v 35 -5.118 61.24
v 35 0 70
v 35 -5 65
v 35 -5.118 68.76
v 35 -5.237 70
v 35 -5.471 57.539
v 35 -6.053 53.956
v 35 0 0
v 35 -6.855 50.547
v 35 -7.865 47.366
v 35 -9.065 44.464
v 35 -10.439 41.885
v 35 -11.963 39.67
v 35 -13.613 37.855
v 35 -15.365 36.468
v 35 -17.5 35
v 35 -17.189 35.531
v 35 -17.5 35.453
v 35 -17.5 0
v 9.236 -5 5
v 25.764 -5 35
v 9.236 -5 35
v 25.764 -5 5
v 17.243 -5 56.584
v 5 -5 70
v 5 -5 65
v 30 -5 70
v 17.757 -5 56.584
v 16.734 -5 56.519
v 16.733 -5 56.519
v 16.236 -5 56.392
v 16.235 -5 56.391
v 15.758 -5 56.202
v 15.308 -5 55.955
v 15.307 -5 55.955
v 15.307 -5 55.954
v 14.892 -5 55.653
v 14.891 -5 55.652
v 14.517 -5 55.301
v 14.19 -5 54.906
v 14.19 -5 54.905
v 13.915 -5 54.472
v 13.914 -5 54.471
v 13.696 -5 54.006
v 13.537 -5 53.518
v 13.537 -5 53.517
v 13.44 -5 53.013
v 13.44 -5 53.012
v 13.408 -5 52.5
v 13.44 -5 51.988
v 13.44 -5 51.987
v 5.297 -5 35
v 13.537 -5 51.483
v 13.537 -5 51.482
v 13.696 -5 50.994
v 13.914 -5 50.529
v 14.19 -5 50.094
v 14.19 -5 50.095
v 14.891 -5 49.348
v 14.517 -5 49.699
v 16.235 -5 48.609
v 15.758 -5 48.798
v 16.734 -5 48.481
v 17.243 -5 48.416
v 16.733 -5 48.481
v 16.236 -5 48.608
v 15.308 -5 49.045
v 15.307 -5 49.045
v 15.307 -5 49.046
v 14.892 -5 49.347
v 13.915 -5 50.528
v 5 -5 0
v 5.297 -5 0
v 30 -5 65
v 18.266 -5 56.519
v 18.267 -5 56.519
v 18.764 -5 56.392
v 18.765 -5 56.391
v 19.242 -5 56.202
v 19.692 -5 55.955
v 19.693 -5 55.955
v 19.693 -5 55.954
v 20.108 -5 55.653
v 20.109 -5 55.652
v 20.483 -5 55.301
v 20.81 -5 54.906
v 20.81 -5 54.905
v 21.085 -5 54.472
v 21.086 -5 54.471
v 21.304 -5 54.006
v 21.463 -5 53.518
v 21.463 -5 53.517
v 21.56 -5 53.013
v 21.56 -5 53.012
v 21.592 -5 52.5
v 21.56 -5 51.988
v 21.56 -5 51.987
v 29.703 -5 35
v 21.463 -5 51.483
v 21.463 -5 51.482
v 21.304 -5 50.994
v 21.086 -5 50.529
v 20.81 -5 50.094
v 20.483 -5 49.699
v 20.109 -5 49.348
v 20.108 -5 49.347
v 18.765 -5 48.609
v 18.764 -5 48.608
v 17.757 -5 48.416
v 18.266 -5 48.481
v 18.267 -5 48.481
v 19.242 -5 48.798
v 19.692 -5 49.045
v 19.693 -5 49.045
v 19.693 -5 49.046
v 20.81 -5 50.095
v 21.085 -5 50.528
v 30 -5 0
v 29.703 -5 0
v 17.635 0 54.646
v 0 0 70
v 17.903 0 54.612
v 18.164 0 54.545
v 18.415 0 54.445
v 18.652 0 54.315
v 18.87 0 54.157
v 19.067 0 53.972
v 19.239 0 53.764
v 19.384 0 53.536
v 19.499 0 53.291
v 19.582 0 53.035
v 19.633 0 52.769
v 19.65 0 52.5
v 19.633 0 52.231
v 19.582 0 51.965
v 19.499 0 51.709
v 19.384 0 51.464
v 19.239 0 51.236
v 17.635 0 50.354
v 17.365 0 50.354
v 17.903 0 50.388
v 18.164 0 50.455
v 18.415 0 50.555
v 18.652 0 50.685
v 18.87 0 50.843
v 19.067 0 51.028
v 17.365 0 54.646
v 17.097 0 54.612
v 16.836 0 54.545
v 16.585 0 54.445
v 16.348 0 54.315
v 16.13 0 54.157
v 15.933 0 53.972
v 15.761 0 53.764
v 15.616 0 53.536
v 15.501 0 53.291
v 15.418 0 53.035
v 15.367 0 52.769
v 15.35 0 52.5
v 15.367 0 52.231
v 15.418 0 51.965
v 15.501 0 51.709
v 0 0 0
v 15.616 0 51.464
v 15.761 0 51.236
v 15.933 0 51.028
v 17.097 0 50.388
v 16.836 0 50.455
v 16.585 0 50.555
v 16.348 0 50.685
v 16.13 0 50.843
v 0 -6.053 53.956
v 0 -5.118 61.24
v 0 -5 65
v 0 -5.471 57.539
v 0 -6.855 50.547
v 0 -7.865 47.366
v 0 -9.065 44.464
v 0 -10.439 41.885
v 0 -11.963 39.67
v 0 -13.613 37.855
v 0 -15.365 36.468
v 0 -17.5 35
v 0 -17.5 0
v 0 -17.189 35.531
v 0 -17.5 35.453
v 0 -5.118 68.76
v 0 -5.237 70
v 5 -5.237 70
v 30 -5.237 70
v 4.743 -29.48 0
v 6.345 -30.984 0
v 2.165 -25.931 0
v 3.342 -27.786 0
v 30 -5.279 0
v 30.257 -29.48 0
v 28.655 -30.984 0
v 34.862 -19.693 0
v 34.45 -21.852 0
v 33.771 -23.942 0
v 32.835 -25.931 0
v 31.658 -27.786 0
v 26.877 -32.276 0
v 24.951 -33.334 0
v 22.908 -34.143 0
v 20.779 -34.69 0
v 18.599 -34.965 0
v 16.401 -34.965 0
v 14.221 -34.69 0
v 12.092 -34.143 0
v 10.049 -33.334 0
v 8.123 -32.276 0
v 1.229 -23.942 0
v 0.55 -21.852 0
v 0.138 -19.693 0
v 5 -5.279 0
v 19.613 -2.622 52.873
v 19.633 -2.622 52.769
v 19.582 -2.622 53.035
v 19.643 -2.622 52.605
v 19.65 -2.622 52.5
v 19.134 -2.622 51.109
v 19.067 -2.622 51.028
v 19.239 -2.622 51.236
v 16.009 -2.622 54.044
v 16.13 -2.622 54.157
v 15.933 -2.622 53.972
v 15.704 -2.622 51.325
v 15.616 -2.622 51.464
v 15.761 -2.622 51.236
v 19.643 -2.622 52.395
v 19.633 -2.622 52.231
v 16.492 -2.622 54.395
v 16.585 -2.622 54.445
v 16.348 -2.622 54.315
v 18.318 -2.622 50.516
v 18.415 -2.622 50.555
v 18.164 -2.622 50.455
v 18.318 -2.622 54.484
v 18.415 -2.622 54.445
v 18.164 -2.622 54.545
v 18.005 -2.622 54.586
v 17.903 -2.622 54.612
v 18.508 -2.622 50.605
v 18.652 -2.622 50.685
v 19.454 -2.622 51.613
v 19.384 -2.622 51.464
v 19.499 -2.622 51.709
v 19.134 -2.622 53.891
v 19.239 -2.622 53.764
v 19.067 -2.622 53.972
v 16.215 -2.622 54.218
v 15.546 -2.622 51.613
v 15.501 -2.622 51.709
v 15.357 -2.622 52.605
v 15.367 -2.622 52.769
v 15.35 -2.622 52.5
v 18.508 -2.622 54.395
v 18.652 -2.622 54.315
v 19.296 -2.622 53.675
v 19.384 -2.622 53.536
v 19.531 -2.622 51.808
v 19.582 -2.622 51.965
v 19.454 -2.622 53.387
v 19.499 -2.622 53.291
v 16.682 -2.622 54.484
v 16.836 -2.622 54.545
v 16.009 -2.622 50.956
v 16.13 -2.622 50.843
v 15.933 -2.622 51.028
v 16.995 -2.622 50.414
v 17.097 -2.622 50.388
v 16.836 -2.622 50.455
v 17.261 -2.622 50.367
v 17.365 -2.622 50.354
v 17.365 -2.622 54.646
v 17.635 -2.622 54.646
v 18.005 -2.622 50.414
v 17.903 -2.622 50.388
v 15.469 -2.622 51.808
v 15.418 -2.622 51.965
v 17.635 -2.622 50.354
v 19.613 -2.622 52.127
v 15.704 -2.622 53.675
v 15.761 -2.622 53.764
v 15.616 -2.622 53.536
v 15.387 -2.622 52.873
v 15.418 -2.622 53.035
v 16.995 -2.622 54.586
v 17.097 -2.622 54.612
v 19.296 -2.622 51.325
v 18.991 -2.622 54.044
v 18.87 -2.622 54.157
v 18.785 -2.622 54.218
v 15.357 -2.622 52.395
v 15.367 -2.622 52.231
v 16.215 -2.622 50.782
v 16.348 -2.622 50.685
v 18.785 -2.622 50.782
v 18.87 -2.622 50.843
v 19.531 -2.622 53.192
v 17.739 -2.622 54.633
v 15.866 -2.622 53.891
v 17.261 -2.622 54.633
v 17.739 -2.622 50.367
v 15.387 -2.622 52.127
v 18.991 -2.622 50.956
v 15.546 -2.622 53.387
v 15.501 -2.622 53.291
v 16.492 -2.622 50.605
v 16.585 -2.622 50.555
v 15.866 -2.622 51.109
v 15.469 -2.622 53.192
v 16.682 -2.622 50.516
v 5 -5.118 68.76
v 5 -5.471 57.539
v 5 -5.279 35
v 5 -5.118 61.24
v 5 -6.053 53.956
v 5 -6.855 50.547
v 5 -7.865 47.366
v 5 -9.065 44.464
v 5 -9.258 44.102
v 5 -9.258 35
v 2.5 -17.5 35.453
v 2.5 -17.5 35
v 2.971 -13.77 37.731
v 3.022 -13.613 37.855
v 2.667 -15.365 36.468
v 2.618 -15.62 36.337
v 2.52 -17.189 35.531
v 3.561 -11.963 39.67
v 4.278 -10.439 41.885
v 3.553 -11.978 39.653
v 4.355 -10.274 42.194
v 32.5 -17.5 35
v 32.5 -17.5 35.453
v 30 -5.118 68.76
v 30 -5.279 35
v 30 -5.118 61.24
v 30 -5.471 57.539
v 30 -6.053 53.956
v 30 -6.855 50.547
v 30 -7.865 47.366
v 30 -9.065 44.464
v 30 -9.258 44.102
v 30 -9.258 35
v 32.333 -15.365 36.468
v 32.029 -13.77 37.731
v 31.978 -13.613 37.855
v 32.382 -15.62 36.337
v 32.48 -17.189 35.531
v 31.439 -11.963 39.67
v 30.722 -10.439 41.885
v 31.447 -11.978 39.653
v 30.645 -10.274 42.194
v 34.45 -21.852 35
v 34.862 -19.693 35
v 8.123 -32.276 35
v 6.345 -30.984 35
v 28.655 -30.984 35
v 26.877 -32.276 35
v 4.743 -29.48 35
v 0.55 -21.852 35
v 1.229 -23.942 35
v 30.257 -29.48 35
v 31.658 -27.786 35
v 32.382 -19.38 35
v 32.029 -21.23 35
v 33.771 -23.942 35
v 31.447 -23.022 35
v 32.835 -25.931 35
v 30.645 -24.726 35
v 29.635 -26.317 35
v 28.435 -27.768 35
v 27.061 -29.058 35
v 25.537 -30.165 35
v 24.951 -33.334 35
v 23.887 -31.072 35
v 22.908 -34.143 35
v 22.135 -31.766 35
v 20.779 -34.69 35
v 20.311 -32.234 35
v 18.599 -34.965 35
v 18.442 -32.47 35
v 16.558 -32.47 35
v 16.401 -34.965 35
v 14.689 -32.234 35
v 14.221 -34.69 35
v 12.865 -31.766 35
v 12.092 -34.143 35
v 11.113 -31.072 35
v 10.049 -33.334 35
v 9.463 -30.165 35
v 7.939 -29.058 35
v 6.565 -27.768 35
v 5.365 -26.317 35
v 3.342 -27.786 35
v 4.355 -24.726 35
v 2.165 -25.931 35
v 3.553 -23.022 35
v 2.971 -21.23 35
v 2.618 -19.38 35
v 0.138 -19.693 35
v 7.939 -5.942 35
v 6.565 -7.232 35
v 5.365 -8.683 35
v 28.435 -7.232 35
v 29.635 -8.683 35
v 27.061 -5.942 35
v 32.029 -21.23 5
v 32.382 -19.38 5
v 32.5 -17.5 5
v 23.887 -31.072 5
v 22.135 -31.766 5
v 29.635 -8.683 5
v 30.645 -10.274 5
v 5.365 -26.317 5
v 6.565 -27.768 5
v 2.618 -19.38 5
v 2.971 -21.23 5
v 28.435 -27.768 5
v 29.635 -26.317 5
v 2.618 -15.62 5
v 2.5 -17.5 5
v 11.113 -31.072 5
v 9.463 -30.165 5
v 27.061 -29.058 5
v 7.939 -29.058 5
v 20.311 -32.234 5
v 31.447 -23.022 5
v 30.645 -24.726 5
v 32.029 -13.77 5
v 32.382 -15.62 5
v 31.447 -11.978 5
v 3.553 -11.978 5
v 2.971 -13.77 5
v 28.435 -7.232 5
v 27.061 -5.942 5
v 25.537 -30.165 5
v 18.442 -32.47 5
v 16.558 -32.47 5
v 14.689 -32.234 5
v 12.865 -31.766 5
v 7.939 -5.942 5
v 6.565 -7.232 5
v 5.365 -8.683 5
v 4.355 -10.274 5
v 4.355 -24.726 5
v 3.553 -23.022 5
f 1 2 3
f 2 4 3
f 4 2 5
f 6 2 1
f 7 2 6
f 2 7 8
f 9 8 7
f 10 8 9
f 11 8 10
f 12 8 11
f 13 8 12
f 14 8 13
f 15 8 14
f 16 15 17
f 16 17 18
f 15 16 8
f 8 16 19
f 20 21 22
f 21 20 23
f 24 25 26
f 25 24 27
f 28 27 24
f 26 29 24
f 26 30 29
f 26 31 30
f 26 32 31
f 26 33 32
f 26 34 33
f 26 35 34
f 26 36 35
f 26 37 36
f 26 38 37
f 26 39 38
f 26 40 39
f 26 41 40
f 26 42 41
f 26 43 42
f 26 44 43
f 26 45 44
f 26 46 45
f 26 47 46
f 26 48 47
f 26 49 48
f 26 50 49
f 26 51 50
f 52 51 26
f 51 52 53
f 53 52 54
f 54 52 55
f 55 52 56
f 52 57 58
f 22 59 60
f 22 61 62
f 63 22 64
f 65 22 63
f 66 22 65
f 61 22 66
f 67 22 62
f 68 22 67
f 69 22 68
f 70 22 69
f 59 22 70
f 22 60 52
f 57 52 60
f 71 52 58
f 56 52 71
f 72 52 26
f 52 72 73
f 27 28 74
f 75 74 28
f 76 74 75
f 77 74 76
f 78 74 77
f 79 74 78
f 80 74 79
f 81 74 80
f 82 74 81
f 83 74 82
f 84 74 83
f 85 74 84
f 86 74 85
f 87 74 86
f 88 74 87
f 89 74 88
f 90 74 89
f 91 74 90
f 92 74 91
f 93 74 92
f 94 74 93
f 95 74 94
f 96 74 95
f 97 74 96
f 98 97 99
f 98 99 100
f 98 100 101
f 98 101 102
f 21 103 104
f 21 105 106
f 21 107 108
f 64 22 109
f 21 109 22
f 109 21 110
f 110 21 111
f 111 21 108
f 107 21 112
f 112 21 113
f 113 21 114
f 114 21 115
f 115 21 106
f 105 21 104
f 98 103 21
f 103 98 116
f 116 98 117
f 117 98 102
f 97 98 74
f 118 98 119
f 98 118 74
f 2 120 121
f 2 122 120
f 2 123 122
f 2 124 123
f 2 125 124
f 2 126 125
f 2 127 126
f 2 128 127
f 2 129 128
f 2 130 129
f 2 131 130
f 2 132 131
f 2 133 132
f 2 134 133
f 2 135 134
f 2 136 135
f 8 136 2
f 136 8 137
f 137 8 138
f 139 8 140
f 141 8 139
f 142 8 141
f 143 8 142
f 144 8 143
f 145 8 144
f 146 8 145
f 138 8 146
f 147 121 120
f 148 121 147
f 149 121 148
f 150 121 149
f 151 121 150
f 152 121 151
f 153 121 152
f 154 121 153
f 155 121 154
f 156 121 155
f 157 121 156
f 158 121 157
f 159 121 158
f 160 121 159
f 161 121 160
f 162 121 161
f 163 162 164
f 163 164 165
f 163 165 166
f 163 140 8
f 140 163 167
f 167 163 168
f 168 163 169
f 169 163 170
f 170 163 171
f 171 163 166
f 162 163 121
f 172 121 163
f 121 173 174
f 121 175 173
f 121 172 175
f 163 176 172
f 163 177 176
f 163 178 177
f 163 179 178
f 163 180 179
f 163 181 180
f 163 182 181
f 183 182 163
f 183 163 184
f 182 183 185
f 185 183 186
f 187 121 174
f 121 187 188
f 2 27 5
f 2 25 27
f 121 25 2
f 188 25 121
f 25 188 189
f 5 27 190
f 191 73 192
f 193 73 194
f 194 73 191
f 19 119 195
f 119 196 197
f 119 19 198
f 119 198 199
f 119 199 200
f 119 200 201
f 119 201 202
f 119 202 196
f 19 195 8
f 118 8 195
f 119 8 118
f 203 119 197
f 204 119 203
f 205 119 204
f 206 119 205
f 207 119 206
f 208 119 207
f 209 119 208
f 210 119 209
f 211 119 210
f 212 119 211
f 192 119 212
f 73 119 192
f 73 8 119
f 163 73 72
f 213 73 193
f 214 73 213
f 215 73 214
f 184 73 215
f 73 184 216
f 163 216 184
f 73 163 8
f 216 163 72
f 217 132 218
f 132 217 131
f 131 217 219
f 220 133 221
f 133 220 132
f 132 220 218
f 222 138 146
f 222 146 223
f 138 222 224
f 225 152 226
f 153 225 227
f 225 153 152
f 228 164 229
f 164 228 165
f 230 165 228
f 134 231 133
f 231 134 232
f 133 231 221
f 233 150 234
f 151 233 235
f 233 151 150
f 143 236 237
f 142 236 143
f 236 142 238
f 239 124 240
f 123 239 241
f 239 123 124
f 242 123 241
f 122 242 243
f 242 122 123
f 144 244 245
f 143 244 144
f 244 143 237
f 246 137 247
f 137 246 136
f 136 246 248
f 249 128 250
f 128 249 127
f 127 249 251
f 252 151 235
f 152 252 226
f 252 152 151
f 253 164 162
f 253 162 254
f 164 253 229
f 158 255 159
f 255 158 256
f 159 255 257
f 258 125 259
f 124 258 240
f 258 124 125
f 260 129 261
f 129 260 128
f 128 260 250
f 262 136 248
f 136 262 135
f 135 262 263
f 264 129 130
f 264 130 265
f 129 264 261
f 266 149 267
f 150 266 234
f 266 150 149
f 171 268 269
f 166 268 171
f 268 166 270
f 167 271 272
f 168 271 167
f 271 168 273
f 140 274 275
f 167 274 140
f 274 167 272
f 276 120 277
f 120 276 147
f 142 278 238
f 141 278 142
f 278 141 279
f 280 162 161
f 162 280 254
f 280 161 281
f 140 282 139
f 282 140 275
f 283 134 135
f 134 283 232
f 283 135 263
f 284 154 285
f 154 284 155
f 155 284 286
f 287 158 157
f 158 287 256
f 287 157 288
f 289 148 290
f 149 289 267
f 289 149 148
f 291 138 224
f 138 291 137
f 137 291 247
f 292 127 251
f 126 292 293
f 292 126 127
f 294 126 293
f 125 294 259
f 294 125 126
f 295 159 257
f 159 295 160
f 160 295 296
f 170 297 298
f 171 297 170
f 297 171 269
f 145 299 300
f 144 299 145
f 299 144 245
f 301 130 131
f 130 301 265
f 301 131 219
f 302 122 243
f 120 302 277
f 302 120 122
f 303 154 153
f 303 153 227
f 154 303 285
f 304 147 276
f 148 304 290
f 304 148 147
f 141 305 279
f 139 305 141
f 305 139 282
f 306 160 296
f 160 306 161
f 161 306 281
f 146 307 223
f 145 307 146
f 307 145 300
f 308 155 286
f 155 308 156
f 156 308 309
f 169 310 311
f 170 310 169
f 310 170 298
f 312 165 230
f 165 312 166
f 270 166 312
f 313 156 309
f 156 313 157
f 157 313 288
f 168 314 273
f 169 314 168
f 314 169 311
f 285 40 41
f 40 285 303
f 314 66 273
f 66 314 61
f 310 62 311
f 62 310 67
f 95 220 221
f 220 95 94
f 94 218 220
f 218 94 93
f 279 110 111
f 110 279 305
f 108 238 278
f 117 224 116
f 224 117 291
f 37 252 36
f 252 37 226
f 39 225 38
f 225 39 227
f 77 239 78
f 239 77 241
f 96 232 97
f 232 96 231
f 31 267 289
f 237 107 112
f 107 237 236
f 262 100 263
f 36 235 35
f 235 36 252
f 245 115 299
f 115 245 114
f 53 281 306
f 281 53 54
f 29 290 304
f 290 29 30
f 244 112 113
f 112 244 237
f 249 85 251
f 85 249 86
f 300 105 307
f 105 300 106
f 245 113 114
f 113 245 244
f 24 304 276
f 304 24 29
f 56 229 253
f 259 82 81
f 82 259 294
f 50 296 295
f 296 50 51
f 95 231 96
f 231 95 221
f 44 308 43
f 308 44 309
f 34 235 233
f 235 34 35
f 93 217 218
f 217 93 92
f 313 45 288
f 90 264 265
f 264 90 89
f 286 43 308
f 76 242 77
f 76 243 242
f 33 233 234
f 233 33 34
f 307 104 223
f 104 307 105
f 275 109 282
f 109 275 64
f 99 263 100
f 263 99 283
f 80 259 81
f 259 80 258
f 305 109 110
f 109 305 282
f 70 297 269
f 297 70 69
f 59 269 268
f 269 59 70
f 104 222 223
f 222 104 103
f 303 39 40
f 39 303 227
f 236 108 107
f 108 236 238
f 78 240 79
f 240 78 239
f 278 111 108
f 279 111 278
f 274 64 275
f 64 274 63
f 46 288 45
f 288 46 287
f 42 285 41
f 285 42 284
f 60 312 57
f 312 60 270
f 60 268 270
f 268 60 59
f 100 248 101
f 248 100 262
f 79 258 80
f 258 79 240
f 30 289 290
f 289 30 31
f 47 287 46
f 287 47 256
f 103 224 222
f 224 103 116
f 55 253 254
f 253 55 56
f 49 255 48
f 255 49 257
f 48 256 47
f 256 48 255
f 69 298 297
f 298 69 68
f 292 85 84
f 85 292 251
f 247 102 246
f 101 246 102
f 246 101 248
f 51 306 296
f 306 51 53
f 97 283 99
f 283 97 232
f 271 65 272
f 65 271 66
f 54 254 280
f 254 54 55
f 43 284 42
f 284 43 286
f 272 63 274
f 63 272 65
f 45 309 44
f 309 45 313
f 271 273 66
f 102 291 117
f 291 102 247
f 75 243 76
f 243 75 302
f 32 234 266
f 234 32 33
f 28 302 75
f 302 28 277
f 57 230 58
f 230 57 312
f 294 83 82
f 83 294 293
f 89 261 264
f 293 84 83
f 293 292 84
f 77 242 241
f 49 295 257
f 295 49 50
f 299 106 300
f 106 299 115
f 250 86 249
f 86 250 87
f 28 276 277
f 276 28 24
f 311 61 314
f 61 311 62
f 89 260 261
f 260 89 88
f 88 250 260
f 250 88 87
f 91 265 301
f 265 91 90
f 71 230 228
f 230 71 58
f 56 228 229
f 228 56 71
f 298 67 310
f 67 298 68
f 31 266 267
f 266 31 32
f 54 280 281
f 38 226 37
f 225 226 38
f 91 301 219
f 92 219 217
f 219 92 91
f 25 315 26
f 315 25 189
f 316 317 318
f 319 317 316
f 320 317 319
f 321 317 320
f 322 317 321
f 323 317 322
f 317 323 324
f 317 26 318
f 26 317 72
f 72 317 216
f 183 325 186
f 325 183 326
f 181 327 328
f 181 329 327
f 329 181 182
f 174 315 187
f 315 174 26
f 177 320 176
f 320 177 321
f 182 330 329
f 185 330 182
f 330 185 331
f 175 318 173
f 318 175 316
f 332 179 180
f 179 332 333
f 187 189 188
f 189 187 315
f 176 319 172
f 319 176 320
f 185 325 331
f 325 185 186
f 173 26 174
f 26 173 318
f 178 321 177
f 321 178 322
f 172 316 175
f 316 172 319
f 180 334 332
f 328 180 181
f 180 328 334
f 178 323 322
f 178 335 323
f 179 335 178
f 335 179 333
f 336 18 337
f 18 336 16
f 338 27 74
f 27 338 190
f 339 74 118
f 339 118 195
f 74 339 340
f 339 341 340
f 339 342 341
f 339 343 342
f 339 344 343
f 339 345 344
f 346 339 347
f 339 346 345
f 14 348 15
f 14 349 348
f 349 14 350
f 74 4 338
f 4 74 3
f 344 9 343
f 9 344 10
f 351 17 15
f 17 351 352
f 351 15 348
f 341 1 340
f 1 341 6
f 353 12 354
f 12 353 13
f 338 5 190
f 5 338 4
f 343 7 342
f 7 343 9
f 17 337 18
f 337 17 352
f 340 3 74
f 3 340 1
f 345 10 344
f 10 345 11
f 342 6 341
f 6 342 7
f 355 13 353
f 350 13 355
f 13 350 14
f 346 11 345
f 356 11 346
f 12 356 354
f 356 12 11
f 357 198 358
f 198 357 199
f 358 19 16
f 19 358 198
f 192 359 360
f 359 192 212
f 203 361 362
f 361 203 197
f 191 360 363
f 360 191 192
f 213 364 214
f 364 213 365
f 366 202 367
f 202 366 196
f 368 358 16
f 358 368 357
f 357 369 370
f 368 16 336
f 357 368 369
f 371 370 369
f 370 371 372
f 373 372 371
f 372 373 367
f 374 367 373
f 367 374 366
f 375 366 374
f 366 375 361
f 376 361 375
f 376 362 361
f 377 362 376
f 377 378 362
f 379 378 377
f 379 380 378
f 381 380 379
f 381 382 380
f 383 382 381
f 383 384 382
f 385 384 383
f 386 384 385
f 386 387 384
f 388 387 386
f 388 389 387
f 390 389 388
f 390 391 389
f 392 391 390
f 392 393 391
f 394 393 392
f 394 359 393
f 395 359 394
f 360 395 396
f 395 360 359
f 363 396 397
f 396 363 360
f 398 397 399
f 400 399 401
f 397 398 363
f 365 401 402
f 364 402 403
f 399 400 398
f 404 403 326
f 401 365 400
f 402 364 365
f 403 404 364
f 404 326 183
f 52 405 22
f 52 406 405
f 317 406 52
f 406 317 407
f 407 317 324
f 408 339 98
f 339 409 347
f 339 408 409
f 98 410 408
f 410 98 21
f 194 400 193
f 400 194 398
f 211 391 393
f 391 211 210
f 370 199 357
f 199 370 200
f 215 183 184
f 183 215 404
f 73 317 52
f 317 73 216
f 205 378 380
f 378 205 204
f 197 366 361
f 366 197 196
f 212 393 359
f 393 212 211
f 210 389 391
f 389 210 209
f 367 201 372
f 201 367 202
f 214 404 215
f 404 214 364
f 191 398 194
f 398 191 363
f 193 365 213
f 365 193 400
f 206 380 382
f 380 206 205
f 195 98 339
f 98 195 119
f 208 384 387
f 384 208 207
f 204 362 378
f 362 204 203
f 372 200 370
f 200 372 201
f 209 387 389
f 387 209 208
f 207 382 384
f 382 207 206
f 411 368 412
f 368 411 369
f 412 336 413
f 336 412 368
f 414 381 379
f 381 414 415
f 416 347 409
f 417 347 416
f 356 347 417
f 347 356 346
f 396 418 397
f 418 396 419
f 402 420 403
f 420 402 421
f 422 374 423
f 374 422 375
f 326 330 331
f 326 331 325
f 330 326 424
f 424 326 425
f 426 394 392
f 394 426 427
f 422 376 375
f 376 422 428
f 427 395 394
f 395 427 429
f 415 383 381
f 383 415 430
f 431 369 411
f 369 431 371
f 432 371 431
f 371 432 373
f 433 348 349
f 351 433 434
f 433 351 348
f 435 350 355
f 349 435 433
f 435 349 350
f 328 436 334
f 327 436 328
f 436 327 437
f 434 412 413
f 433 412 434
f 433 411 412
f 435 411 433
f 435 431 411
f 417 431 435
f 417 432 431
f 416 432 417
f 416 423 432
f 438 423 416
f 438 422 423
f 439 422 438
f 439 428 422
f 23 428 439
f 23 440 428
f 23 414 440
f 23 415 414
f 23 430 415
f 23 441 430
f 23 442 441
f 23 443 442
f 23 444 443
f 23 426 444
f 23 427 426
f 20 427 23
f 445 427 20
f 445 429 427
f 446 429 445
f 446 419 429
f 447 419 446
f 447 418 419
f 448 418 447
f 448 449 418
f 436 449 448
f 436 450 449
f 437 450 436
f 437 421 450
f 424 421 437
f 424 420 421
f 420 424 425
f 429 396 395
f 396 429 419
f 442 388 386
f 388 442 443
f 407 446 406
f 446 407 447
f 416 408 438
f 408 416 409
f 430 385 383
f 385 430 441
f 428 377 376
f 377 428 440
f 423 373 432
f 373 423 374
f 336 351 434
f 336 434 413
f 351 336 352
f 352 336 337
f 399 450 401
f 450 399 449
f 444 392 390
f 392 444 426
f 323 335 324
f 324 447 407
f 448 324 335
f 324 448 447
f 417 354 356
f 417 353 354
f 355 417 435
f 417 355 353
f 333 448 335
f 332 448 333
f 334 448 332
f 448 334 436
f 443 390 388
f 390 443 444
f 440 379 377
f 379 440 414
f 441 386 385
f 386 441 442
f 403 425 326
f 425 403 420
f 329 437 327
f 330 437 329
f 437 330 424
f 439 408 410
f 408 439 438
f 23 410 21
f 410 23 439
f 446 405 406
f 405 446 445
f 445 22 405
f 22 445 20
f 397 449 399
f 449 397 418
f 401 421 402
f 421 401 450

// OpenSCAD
$fn = 50;

width = 35;
depth = 5;

// /////////////////////////////////////////////////////////////////////////////
// Backing plate

module backplate() {
  screw_r = 4.3/2;
  head_or = 8.2/2;
  head_ir = 3.3/2;
  head_h  = 3;

  difference() {
    cube([width, width*2, depth]);

    translate([width/2, (width*1.5), -1])
    cylinder(r=screw_r, h=depth+2); 

    translate([width/2, (width*1.5), depth+0.01-head_h])
    cylinder(r1=head_ir, r2=head_or, h=head_h);
  }
}

// /////////////////////////////////////////////////////////////////////////////
// Retainer cup

module cup_sideplate() {
  support_d = width-depth;
  support_r = support_d/2;

  difference() {
    translate([0, 0, 0])
    cube([depth, width*2, width/2]);

    translate([-1, support_d+width, support_r+depth])
    rotate([0, 90, 0])
    scale([1, 2, 1])
    cylinder(d=support_d, h=depth+2);
  }
}

module cup_body() {
  translate([width/2, width, width/2])
  rotate([90, 0, 0])
  cylinder(d=width, h=width);
}

module cup_cutout() {
  translate([width/2, width*2+depth, width/2])
  rotate([90, 0, 0])
  cylinder(d=width-depth, h=width*2);
}

// /////////////////////////////////////////////////////////////////////////////
// Housing holder

module housing_holder() {
  backplate();
  difference() {
    union() {
      cup_body();

      cup_sideplate();

      translate([width-depth, 0, 0])
      cup_sideplate();
    }
    cup_cutout();
  }
}

rotate([90, 0, 0])
housing_holder();
